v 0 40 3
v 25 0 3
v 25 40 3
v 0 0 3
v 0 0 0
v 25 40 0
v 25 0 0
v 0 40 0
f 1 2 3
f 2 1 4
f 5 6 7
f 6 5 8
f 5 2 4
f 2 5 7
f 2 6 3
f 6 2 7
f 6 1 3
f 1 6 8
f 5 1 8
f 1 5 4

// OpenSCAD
$fn=360;
//67x93x22
x=25;
y=40;
z=3;
  translate([0,0,0])
  cube([x,y,z]);
